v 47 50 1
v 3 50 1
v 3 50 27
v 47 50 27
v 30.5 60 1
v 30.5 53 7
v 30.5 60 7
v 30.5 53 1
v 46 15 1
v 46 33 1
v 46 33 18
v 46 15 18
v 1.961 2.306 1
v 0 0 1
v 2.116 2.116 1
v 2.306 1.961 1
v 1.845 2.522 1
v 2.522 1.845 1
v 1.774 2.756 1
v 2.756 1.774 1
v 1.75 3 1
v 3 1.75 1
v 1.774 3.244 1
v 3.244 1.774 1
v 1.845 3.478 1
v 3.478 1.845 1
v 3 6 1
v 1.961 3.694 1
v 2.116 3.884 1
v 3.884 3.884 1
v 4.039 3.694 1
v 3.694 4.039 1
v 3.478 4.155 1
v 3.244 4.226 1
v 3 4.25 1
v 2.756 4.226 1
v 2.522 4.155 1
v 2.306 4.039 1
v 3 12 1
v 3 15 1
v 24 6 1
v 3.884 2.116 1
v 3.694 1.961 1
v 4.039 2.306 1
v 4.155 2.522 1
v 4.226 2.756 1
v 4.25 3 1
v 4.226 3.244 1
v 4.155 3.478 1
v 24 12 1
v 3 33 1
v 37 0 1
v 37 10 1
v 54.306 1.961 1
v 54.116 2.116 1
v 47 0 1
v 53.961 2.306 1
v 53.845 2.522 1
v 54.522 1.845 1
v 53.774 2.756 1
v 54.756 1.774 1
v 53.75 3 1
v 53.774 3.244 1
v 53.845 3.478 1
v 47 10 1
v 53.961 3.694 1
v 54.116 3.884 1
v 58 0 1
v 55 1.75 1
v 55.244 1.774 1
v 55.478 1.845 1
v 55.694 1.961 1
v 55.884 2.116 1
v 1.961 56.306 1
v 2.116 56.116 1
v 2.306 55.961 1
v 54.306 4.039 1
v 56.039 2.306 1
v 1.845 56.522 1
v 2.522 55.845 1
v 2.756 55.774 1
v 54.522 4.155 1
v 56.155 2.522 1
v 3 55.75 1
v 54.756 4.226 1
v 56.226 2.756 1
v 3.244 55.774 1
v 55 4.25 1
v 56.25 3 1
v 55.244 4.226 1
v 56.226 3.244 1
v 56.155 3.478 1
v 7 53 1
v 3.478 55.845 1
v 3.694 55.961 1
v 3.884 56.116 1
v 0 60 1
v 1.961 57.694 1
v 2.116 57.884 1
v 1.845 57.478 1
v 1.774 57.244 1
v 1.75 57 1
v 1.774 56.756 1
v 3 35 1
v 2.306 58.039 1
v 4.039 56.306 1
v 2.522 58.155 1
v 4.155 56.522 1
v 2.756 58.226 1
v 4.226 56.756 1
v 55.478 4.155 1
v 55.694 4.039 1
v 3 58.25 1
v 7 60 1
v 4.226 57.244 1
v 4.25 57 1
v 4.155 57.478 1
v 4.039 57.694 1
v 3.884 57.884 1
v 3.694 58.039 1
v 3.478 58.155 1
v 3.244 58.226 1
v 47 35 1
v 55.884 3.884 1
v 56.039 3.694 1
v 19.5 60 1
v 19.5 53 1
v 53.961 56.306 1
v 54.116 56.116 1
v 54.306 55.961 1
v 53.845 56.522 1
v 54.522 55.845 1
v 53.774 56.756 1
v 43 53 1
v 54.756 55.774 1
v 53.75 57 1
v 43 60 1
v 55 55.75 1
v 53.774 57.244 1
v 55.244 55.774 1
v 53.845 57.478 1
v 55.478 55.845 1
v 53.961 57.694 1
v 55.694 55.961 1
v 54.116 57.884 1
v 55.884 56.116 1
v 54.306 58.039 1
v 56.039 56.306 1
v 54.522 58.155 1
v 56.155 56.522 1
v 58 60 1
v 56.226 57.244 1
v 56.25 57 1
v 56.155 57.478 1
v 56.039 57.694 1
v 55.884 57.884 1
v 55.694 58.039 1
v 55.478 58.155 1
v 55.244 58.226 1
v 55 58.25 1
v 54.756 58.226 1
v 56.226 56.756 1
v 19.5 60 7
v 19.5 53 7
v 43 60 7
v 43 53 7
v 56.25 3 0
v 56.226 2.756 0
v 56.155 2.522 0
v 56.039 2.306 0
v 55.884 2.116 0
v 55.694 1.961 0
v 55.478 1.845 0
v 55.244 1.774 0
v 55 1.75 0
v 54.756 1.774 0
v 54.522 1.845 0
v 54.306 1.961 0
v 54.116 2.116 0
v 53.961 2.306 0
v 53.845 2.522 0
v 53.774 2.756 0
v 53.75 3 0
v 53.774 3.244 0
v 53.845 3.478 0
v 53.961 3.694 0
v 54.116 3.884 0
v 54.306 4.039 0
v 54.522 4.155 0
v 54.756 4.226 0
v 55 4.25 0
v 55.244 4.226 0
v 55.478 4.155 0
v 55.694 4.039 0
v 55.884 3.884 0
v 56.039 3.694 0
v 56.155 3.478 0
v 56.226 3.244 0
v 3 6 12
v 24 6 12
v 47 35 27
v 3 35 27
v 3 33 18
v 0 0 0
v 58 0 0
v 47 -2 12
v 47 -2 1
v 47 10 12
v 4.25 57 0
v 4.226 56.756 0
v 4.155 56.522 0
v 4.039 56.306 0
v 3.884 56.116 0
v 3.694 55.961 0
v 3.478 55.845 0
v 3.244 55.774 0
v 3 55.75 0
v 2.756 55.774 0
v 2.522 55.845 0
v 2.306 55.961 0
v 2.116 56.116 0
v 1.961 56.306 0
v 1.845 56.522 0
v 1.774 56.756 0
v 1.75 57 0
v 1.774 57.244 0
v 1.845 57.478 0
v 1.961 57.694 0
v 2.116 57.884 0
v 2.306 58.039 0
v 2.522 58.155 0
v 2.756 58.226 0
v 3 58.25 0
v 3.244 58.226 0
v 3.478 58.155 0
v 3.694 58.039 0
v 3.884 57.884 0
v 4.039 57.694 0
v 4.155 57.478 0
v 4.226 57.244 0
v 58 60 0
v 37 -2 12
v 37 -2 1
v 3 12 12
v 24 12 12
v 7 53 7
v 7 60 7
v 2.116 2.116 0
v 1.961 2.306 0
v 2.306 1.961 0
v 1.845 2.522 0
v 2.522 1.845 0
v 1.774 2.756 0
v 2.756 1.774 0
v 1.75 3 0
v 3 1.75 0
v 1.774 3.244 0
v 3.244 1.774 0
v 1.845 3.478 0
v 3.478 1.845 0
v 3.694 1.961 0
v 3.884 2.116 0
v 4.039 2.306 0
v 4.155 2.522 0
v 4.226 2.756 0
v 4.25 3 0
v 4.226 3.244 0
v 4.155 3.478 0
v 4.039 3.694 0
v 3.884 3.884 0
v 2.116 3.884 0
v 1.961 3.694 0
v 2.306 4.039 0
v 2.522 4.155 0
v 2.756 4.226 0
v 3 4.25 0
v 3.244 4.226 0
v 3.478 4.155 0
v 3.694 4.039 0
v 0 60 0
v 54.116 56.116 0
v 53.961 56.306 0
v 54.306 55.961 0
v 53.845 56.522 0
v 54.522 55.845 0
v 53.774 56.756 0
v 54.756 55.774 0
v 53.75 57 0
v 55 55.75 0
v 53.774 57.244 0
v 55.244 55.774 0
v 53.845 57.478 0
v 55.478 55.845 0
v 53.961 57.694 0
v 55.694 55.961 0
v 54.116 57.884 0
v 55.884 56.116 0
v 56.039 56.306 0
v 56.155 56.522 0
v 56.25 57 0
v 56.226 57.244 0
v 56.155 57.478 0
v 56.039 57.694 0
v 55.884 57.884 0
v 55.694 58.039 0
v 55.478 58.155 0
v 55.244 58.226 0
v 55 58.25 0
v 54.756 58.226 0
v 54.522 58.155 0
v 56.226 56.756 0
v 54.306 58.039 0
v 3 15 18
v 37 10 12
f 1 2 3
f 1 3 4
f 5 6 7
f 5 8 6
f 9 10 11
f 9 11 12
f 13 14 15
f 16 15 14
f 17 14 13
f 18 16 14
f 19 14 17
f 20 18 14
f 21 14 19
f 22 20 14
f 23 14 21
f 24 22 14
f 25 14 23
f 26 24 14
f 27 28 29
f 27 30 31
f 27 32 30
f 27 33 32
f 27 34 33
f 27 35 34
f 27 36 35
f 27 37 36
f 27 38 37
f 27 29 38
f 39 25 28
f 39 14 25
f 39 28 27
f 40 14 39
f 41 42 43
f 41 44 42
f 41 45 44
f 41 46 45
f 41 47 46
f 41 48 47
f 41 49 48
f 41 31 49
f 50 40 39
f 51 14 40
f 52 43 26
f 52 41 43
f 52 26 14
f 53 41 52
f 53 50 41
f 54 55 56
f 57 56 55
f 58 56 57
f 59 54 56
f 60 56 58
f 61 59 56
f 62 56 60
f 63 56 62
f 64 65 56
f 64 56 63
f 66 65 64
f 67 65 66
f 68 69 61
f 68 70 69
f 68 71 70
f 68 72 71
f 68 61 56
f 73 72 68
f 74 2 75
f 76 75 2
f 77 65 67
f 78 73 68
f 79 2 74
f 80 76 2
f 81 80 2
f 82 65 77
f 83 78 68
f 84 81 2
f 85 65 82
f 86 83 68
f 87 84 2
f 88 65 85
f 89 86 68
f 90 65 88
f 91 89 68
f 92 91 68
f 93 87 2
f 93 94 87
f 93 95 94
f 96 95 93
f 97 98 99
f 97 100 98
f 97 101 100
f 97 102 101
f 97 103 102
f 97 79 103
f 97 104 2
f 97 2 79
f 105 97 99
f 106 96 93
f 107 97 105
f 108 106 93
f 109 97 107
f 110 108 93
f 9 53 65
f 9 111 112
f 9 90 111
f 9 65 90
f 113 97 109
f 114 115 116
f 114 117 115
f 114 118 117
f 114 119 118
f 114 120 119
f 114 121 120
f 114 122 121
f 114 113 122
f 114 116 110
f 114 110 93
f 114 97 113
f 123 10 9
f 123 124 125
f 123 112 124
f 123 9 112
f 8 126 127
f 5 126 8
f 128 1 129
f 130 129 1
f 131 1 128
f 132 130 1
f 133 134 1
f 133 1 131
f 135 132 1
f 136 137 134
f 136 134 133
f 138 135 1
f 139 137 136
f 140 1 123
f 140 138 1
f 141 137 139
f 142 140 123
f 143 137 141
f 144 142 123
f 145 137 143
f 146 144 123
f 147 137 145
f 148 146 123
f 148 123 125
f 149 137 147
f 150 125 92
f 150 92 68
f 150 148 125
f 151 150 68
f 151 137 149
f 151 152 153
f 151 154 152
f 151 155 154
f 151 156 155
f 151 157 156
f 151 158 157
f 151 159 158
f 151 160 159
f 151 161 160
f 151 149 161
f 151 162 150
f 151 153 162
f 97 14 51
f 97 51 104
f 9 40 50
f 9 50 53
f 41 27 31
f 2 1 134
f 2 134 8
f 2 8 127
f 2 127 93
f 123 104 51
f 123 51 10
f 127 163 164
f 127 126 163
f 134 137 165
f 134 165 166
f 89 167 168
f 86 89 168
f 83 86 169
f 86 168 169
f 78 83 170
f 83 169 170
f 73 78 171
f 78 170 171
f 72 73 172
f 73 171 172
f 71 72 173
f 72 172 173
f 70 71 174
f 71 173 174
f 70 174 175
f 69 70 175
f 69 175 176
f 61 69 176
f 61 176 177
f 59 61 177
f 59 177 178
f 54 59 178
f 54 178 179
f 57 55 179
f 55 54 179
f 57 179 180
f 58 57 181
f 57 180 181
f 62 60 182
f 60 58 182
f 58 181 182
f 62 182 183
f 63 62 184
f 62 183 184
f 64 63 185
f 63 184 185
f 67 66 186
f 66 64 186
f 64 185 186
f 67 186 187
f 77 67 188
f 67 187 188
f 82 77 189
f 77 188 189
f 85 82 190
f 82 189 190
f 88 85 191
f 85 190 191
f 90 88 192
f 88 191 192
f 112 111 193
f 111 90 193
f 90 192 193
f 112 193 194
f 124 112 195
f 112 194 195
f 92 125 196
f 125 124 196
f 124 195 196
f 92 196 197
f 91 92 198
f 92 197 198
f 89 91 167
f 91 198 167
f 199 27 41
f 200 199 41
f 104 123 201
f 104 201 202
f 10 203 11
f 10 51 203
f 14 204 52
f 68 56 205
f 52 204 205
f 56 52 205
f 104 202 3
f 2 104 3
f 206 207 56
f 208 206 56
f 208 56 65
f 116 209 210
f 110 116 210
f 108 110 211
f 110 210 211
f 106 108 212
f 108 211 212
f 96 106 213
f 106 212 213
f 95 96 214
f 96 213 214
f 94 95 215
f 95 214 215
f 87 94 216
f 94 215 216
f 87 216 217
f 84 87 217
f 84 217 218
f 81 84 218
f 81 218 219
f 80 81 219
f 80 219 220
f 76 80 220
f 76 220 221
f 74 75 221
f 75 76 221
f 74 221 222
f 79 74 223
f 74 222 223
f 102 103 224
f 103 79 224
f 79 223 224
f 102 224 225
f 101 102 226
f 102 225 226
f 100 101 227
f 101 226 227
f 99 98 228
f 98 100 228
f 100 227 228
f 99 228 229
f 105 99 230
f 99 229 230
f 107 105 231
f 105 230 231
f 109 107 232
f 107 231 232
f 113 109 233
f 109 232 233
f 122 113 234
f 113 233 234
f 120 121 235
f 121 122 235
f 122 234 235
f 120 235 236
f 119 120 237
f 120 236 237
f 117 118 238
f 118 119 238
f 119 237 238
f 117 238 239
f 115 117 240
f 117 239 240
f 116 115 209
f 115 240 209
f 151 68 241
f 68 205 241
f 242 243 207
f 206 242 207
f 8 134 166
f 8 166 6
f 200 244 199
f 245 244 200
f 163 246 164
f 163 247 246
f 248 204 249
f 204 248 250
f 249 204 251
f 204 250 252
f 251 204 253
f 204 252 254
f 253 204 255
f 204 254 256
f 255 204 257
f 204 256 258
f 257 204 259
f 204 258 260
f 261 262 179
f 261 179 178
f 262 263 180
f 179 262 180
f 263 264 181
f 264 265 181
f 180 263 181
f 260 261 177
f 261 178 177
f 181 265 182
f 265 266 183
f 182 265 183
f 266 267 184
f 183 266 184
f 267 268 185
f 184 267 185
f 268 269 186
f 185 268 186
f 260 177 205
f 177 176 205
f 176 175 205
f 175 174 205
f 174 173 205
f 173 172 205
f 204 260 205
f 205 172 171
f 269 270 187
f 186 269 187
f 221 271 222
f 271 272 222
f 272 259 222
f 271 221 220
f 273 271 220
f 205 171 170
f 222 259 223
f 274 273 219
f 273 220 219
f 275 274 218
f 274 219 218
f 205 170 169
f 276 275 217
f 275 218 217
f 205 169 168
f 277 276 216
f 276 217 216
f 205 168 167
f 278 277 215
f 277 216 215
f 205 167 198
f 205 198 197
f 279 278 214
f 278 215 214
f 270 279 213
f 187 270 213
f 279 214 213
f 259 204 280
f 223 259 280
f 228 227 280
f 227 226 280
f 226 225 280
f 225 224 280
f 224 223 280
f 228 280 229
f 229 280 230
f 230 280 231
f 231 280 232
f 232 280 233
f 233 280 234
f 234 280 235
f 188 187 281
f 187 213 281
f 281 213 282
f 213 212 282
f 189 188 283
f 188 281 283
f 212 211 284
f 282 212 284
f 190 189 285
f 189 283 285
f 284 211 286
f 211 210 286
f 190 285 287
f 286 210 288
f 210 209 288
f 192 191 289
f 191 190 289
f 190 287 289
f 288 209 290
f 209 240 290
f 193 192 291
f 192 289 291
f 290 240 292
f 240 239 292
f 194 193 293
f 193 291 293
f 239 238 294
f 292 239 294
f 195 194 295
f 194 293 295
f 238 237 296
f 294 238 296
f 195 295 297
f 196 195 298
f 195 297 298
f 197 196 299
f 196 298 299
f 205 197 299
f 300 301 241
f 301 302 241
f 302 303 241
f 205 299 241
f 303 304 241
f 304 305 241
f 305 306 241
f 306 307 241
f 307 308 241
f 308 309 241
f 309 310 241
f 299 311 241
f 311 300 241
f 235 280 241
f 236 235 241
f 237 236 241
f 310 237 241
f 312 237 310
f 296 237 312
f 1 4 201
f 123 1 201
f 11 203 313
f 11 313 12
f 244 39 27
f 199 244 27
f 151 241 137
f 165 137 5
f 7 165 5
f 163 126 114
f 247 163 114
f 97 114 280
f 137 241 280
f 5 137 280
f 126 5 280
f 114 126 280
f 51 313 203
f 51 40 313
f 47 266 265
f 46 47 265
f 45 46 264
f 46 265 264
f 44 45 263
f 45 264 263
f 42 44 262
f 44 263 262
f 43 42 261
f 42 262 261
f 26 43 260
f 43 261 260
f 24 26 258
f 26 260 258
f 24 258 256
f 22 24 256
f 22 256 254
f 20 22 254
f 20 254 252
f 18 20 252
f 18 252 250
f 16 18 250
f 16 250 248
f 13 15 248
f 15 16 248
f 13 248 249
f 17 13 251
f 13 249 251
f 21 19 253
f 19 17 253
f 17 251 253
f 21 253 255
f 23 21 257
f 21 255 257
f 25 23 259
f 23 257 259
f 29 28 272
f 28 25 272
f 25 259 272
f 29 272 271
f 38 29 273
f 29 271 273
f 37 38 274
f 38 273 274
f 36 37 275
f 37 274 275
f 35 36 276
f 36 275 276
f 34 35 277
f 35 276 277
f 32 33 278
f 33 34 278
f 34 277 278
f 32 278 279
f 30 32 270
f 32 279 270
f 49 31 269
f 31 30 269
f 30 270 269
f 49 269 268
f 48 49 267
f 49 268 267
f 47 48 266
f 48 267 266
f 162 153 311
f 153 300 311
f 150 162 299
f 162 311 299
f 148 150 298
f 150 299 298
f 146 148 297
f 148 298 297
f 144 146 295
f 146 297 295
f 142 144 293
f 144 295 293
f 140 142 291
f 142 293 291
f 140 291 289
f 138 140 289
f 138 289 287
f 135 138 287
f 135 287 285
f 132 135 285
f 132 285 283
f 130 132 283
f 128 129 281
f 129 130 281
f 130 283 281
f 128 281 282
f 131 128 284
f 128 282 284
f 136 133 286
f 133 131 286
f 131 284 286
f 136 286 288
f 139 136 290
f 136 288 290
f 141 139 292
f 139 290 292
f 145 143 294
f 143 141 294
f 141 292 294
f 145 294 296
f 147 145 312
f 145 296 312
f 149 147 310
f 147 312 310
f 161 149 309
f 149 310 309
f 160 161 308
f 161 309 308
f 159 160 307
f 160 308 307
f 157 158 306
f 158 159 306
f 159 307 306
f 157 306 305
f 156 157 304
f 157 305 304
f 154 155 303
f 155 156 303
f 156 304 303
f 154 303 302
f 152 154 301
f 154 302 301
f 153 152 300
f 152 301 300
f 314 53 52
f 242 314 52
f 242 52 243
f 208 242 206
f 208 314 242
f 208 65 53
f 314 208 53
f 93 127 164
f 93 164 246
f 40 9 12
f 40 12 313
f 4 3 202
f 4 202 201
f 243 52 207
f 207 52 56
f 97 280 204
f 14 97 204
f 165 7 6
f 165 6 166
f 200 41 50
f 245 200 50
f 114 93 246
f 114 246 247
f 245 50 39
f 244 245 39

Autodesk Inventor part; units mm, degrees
ref_plane "YZ Plane" through (0, 0, 0) normal (1, 0, 0) x (0, 1, 0)
ref_plane "XZ Plane" through (0, 0, 0) normal (0, 1, 0) x (-1, 0, 0)
ref_plane "XY Plane" through (0, 0, 0) normal (0, 0, 1) x (1, 0, 0)
sketch "Эскиз1" plane through (0, 0, 0) normal (0, 0, 1) x (1, 0, 0)
  line L0 (0, 0) -> (58, 0)
  line L1 (58, 0) -> (58, 60)
  line L2 (58, 60) -> (0, 60)
  line L3 (0, 60) -> (0, 0)
  line L4 (0, 57) -> (58, 57) construction
  line L5 (0, 3) -> (58, 3) construction
  line L6 (3, 0) -> (3, 60) construction
  line L7 (55, 60) -> (55, 0) construction
  circle A0 centre (3, 57) radius 1.25
  circle A1 centre (55, 57) radius 1.25
  circle A2 centre (55, 3) radius 1.25
  circle A3 centre (3, 3) radius 1.25
  dimension "d0" = 58
  dimension "d1" = 60
  dimension "d2" = 52
  dimension "d3" = 54
  dimension "d4" = 3
  dimension "d5" = 3
  dimension "d6" = 2.5
extrude "Выдавливание1" add sketch "Эскиз1" along normal blind 1
sketch "Эскиз2" plane through (0, 0, 1) normal (0, 0, 1) x (1, 0, 0)
  line L0 (37, -2) -> (47, -2)
  line L1 (47, -2) -> (47, 10)
  line L2 (47, 10) -> (37, 10)
  line L3 (37, 10) -> (37, -2)
  line L4 (0, 60) -> (0, 0) projected
  line L5 (58, 0) -> (58, 60) projected
  line L6 (0, 0) -> (58, 0) projected
  dimension "d9" = 37
  dimension "d10" = 11
  dimension "d14" = 2
  dimension "d15" = 12
extrude "Выдавливание2" add sketch "Эскиз2" along normal blind 11
sketch "Эскиз3" plane through (0, 0, 1) normal (0, 0, 1) x (1, 0, 0)
  line L0 (7, 60) -> (19.5, 60)
  line L1 (19.5, 60) -> (19.5, 53)
  line L2 (19.5, 53) -> (7, 53)
  line L3 (7, 53) -> (7, 60)
  line L4 (58, 60) -> (0, 60) projected
  line L5 (0, 60) -> (0, 0) projected
  line L6 (58, 0) -> (58, 60) projected
  line L7 (30.5, 60) -> (43, 60)
  line L8 (43, 60) -> (43, 53)
  line L9 (43, 53) -> (30.5, 53)
  line L10 (30.5, 53) -> (30.5, 60)
  dimension "d16" = 7
  dimension "d18" = 15
  dimension "d19" = 12.5
  dimension "d20" = 7
extrude "Выдавливание3" add sketch "Эскиз3" along normal blind 6
sketch "Эскиз4" plane through (0, 0, 1) normal (0, 0, 1) x (1, 0, 0)
  line L0 (3, 50) -> (47, 50)
  line L1 (47, 50) -> (47, 35)
  line L2 (47, 35) -> (3, 35)
  line L3 (3, 35) -> (3, 50)
  line L4 (0, 60) -> (0, 0) projected
  line L5 (30.5, 60) -> (19.5, 60) projected
  dimension "d23" = 15
  dimension "d24" = 44
  dimension "d25" = 3
  dimension "d26" = 10
extrude "Выдавливание4" add sketch "Эскиз4" along normal blind 26
sketch "Эскиз5" plane through (0, 0, 1) normal (0, 0, 1) x (1, 0, 0)
  line L0 (3, 33) -> (46, 33)
  line L1 (46, 33) -> (46, 15)
  line L2 (46, 15) -> (3, 15)
  line L3 (3, 15) -> (3, 33)
  line L4 (0, 0) -> (37, 0) projected
  line L5 (0, 60) -> (0, 0) projected
  line L6 (58, 0) -> (58, 60) projected
  dimension "d29" = 15
  dimension "d30" = 3
  dimension "d31" = 18
  dimension "d32" = 12
extrude "Выдавливание5" add sketch "Эскиз5" along normal blind 17
sketch "Эскиз6" plane through (0, 0, 1) normal (0, 0, 1) x (1, 0, 0)
  line L0 (24, 12) -> (3, 12)
  line L1 (3, 12) -> (3, 6)
  line L2 (3, 6) -> (24, 6)
  line L3 (24, 6) -> (24, 12)
  line L4 (0, 0) -> (37, 0) projected
  line L5 (0, 60) -> (0, 0) projected
  dimension "d35" = 6
  dimension "d36" = 3
  dimension "d37" = 6
  dimension "d38" = 21
extrude "Выдавливание6" add sketch "Эскиз6" along normal blind 11
properties part number "Плата"
